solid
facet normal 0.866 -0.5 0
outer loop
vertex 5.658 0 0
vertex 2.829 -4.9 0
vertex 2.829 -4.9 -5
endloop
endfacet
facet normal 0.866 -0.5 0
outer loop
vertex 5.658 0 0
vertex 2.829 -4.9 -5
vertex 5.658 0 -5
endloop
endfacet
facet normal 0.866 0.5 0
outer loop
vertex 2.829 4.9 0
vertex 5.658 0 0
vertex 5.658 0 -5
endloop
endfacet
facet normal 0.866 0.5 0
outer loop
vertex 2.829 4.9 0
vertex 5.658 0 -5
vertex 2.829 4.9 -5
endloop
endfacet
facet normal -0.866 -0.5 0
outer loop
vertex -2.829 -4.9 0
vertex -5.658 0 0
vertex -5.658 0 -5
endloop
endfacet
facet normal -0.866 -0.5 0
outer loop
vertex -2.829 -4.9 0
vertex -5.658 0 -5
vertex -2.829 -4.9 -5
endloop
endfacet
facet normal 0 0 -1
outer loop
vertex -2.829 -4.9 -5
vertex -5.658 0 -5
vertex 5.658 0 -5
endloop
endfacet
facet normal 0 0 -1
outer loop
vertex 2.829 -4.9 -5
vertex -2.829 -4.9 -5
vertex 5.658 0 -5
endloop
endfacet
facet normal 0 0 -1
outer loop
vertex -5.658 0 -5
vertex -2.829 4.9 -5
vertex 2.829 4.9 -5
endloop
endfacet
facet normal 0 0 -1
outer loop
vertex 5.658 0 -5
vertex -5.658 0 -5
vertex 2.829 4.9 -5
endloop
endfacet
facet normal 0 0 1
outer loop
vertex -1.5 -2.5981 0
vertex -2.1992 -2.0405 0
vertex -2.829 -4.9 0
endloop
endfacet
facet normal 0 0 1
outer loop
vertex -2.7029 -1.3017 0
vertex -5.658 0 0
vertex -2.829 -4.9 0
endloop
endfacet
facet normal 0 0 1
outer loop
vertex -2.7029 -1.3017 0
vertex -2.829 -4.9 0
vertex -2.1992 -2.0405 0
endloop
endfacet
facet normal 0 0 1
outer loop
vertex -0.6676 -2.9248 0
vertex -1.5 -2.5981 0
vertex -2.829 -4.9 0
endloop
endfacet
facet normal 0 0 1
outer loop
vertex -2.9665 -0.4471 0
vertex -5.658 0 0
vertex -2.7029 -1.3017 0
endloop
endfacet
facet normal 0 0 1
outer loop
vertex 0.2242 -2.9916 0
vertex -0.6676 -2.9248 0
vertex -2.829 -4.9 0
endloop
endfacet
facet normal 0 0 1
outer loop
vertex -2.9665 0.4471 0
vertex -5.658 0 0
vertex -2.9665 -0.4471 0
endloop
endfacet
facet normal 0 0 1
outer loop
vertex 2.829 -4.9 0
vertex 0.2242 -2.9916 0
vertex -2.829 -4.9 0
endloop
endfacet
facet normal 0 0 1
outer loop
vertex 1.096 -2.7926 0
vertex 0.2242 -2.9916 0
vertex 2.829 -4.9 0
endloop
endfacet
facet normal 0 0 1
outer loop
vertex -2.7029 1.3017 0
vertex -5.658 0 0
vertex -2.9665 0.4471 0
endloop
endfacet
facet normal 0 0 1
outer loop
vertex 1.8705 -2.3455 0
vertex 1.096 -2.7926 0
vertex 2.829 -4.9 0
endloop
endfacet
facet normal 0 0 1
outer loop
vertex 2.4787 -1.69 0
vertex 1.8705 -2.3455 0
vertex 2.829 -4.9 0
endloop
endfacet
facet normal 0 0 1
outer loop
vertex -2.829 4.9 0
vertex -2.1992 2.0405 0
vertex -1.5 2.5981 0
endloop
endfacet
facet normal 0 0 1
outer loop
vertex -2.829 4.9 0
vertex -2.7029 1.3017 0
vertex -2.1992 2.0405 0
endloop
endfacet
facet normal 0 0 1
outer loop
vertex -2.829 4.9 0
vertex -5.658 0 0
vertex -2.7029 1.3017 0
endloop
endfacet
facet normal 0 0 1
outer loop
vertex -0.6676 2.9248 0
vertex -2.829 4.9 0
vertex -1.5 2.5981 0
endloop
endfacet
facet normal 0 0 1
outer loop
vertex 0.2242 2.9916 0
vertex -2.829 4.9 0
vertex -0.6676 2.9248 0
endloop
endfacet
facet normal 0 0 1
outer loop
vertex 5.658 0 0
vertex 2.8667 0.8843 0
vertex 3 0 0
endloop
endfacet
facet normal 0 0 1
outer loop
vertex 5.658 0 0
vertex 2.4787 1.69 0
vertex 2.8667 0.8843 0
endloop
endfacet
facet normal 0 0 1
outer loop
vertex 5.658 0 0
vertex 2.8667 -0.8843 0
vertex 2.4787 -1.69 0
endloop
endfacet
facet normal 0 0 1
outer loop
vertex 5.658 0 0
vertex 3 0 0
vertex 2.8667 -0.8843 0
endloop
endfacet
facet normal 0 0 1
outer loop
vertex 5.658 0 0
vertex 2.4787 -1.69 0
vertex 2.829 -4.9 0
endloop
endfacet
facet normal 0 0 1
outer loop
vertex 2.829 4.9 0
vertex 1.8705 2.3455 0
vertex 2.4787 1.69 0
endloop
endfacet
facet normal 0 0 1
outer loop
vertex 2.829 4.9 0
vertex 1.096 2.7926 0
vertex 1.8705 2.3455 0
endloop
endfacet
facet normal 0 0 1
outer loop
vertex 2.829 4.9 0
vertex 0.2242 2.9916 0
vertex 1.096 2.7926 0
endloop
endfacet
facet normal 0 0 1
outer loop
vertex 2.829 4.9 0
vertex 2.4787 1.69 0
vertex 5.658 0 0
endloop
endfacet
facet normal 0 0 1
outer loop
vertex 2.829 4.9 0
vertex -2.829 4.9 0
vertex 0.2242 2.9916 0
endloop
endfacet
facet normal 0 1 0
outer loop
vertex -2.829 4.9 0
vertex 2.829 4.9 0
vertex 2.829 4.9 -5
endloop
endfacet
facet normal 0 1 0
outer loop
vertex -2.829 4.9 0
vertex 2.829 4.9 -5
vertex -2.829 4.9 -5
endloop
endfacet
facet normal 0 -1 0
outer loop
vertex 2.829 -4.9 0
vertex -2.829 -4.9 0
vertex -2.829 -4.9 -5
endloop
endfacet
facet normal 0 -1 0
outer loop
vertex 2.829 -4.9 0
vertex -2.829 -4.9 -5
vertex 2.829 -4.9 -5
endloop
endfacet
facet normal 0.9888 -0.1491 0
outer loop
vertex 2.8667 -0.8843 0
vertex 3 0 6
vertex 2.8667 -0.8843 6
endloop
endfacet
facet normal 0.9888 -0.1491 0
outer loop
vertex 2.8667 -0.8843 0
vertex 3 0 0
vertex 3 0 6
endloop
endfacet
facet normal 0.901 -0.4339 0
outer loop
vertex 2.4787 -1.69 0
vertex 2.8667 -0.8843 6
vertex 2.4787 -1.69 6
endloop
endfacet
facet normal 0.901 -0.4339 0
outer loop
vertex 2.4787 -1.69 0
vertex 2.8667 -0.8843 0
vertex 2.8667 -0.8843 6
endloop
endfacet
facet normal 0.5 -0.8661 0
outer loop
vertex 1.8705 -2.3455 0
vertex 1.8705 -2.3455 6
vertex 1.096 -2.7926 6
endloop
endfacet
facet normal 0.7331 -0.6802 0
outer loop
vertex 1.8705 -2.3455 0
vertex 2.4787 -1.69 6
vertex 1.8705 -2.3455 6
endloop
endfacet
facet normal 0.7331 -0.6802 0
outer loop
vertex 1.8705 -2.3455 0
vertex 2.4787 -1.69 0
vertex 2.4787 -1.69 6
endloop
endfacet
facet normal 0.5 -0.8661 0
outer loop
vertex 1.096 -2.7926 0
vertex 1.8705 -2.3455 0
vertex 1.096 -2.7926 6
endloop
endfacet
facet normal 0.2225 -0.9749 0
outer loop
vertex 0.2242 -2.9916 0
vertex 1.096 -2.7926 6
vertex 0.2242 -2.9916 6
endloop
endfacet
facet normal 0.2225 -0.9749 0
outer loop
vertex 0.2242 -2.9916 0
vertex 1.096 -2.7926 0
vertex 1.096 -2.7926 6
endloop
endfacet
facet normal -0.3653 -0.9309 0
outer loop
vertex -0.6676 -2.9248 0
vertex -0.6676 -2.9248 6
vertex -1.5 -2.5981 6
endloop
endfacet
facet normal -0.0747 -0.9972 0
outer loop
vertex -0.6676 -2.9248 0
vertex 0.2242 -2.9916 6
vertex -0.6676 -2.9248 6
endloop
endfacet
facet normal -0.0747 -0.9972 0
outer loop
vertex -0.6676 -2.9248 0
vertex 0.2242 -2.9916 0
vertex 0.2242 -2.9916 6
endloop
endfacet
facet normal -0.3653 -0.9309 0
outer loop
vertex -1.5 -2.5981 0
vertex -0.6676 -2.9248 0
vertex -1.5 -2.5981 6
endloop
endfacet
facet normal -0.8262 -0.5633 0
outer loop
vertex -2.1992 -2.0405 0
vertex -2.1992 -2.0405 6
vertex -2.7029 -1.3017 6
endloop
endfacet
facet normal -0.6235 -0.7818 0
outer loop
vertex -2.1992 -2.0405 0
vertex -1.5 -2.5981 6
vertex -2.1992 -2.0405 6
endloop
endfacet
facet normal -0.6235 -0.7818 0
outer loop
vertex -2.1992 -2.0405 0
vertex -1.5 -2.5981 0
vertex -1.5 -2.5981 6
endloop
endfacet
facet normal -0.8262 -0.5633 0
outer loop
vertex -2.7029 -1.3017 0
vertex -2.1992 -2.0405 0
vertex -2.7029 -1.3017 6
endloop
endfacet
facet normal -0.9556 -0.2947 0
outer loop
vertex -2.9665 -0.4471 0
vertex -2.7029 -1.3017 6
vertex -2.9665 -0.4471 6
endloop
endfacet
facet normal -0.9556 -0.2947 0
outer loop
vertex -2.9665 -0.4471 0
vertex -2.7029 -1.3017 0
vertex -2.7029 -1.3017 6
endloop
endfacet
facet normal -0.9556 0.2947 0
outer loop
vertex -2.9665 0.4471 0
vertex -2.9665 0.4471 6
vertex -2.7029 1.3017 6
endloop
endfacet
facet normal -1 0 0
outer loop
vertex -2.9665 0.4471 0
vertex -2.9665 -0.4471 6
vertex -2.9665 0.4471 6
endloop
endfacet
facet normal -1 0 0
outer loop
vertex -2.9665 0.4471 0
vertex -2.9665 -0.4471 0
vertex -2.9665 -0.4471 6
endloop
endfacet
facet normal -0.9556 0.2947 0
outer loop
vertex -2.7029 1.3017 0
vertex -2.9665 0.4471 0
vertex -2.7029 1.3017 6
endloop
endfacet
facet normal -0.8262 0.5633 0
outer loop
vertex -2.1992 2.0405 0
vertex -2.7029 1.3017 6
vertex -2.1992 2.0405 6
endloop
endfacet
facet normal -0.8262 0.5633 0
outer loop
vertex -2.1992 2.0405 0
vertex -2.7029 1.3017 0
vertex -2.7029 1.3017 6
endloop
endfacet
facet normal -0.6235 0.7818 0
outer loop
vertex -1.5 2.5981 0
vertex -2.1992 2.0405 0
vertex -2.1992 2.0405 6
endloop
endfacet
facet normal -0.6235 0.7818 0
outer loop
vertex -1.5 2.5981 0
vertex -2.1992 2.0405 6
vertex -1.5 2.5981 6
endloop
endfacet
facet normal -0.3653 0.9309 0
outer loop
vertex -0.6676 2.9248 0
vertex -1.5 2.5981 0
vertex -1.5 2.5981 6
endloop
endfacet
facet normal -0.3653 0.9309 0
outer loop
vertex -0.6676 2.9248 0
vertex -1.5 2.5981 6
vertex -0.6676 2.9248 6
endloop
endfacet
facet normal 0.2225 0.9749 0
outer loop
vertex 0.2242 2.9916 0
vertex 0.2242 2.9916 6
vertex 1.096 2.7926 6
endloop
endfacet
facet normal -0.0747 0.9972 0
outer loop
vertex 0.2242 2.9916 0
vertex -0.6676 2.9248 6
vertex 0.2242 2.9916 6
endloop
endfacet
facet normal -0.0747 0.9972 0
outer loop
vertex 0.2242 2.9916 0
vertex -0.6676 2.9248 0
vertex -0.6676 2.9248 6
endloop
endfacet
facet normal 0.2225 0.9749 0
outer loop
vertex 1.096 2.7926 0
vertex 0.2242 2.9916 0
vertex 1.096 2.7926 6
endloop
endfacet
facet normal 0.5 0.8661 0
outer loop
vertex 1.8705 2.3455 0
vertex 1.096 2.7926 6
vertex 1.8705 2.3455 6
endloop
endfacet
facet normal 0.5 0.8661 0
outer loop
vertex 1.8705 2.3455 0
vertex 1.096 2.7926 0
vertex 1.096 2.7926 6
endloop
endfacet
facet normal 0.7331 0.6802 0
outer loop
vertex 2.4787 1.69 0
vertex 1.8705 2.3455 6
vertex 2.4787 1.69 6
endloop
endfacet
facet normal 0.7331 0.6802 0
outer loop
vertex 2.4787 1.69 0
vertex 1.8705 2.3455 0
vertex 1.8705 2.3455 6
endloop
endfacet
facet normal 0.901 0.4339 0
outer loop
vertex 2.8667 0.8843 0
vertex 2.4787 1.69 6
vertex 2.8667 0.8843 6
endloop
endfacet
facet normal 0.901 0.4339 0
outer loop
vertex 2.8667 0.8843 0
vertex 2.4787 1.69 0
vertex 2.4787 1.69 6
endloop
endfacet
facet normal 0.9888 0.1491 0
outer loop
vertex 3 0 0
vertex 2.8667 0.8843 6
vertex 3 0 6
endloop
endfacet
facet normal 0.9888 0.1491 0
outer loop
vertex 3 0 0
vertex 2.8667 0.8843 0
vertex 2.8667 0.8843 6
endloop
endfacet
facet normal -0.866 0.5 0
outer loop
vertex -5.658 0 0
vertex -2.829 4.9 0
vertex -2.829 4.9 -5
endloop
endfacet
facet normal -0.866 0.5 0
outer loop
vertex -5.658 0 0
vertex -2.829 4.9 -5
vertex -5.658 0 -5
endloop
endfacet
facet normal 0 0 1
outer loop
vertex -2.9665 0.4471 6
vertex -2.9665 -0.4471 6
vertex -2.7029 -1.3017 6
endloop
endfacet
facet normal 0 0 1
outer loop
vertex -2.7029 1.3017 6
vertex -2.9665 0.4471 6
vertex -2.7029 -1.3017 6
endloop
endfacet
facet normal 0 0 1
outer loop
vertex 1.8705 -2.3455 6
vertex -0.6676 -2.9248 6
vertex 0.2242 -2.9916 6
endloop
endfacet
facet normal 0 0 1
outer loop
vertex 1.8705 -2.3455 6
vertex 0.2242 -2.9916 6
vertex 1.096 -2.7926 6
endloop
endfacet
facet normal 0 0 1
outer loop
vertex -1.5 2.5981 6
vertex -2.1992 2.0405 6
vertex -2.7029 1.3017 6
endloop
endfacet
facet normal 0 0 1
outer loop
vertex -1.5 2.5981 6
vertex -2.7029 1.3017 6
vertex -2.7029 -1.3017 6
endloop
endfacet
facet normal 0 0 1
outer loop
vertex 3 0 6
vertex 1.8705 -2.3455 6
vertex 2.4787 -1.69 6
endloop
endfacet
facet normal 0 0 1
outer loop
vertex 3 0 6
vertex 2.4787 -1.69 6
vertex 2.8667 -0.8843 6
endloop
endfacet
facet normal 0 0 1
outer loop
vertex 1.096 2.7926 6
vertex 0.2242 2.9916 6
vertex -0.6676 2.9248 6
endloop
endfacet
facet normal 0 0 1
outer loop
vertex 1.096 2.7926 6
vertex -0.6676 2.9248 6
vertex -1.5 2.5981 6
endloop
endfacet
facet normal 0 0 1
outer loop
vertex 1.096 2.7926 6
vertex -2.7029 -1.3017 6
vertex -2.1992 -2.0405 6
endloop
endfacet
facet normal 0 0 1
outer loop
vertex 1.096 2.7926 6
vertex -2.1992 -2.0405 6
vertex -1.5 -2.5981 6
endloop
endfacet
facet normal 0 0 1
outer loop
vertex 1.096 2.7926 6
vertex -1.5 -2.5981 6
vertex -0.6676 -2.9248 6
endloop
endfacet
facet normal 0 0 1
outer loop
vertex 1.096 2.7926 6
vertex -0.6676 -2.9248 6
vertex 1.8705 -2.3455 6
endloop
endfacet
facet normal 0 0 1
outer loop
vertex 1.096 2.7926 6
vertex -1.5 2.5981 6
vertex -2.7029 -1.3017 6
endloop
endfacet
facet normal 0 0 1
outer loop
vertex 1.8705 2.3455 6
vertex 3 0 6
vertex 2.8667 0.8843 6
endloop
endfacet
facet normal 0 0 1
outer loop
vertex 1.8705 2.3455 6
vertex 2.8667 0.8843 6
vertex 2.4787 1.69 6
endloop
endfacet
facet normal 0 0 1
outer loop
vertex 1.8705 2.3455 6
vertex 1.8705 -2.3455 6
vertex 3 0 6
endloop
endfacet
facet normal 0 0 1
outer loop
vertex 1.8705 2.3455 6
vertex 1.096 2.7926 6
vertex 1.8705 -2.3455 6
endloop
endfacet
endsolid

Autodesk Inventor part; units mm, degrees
ref_plane "YZ Plane" through (0, 0, 0) normal (1, 0, 0) x (0, 1, 0)
ref_plane "XZ Plane" through (0, 0, 0) normal (0, 1, 0) x (-1, 0, 0)
ref_plane "XY Plane" through (0, 0, 0) normal (0, 0, 1) x (1, 0, 0)
sketch "Sketch1" plane through (0, 0, 0) normal (0, 0, 1) x (1, 0, 0)
  circle A0 centre (0, 0) radius 3
  dimension "d0" = 6
extrude "Extrusion1" add sketch "Sketch1" along normal blind 6
sketch "Sketch2" plane through (0, 0, 0) normal (0, 0, 1) x (1, 0, 0)
  circle A0 centre (0, 0) radius 4.9 construction
  line L0 (2.829, 4.9) -> (-2.829, 4.9)
  line L1 (0, -6.86) -> (0, 6.86) projected
  line L2 (-2.829, 4.9) -> (-5.658, 0)
  line L3 (-5.658, 0) -> (-2.829, -4.9)
  line L4 (-2.829, -4.9) -> (2.829, -4.9)
  line L5 (2.829, -4.9) -> (5.658, 0)
  line L6 (5.658, 0) -> (2.829, 4.9)
  point P0 (0, 4.9)
  point P1 (-4.2435, 2.45)
  point P2 (-4.2435, -2.45)
  point P3 (0, -4.9)
  point P4 (4.2435, -2.45)
  point P5 (4.2435, 2.45)
  point P6 (-5.658, 0)
  point P7 (5.658, 0)
  dimension "d3" = 9.8
  dimension "d6" = 360
extrude "Extrusion2" add sketch "Sketch2" against normal blind 5
thread "Thread1" size "M6x1" class "6g" standard "ANSI Metric M Profile" full length
properties part number "Screw"
